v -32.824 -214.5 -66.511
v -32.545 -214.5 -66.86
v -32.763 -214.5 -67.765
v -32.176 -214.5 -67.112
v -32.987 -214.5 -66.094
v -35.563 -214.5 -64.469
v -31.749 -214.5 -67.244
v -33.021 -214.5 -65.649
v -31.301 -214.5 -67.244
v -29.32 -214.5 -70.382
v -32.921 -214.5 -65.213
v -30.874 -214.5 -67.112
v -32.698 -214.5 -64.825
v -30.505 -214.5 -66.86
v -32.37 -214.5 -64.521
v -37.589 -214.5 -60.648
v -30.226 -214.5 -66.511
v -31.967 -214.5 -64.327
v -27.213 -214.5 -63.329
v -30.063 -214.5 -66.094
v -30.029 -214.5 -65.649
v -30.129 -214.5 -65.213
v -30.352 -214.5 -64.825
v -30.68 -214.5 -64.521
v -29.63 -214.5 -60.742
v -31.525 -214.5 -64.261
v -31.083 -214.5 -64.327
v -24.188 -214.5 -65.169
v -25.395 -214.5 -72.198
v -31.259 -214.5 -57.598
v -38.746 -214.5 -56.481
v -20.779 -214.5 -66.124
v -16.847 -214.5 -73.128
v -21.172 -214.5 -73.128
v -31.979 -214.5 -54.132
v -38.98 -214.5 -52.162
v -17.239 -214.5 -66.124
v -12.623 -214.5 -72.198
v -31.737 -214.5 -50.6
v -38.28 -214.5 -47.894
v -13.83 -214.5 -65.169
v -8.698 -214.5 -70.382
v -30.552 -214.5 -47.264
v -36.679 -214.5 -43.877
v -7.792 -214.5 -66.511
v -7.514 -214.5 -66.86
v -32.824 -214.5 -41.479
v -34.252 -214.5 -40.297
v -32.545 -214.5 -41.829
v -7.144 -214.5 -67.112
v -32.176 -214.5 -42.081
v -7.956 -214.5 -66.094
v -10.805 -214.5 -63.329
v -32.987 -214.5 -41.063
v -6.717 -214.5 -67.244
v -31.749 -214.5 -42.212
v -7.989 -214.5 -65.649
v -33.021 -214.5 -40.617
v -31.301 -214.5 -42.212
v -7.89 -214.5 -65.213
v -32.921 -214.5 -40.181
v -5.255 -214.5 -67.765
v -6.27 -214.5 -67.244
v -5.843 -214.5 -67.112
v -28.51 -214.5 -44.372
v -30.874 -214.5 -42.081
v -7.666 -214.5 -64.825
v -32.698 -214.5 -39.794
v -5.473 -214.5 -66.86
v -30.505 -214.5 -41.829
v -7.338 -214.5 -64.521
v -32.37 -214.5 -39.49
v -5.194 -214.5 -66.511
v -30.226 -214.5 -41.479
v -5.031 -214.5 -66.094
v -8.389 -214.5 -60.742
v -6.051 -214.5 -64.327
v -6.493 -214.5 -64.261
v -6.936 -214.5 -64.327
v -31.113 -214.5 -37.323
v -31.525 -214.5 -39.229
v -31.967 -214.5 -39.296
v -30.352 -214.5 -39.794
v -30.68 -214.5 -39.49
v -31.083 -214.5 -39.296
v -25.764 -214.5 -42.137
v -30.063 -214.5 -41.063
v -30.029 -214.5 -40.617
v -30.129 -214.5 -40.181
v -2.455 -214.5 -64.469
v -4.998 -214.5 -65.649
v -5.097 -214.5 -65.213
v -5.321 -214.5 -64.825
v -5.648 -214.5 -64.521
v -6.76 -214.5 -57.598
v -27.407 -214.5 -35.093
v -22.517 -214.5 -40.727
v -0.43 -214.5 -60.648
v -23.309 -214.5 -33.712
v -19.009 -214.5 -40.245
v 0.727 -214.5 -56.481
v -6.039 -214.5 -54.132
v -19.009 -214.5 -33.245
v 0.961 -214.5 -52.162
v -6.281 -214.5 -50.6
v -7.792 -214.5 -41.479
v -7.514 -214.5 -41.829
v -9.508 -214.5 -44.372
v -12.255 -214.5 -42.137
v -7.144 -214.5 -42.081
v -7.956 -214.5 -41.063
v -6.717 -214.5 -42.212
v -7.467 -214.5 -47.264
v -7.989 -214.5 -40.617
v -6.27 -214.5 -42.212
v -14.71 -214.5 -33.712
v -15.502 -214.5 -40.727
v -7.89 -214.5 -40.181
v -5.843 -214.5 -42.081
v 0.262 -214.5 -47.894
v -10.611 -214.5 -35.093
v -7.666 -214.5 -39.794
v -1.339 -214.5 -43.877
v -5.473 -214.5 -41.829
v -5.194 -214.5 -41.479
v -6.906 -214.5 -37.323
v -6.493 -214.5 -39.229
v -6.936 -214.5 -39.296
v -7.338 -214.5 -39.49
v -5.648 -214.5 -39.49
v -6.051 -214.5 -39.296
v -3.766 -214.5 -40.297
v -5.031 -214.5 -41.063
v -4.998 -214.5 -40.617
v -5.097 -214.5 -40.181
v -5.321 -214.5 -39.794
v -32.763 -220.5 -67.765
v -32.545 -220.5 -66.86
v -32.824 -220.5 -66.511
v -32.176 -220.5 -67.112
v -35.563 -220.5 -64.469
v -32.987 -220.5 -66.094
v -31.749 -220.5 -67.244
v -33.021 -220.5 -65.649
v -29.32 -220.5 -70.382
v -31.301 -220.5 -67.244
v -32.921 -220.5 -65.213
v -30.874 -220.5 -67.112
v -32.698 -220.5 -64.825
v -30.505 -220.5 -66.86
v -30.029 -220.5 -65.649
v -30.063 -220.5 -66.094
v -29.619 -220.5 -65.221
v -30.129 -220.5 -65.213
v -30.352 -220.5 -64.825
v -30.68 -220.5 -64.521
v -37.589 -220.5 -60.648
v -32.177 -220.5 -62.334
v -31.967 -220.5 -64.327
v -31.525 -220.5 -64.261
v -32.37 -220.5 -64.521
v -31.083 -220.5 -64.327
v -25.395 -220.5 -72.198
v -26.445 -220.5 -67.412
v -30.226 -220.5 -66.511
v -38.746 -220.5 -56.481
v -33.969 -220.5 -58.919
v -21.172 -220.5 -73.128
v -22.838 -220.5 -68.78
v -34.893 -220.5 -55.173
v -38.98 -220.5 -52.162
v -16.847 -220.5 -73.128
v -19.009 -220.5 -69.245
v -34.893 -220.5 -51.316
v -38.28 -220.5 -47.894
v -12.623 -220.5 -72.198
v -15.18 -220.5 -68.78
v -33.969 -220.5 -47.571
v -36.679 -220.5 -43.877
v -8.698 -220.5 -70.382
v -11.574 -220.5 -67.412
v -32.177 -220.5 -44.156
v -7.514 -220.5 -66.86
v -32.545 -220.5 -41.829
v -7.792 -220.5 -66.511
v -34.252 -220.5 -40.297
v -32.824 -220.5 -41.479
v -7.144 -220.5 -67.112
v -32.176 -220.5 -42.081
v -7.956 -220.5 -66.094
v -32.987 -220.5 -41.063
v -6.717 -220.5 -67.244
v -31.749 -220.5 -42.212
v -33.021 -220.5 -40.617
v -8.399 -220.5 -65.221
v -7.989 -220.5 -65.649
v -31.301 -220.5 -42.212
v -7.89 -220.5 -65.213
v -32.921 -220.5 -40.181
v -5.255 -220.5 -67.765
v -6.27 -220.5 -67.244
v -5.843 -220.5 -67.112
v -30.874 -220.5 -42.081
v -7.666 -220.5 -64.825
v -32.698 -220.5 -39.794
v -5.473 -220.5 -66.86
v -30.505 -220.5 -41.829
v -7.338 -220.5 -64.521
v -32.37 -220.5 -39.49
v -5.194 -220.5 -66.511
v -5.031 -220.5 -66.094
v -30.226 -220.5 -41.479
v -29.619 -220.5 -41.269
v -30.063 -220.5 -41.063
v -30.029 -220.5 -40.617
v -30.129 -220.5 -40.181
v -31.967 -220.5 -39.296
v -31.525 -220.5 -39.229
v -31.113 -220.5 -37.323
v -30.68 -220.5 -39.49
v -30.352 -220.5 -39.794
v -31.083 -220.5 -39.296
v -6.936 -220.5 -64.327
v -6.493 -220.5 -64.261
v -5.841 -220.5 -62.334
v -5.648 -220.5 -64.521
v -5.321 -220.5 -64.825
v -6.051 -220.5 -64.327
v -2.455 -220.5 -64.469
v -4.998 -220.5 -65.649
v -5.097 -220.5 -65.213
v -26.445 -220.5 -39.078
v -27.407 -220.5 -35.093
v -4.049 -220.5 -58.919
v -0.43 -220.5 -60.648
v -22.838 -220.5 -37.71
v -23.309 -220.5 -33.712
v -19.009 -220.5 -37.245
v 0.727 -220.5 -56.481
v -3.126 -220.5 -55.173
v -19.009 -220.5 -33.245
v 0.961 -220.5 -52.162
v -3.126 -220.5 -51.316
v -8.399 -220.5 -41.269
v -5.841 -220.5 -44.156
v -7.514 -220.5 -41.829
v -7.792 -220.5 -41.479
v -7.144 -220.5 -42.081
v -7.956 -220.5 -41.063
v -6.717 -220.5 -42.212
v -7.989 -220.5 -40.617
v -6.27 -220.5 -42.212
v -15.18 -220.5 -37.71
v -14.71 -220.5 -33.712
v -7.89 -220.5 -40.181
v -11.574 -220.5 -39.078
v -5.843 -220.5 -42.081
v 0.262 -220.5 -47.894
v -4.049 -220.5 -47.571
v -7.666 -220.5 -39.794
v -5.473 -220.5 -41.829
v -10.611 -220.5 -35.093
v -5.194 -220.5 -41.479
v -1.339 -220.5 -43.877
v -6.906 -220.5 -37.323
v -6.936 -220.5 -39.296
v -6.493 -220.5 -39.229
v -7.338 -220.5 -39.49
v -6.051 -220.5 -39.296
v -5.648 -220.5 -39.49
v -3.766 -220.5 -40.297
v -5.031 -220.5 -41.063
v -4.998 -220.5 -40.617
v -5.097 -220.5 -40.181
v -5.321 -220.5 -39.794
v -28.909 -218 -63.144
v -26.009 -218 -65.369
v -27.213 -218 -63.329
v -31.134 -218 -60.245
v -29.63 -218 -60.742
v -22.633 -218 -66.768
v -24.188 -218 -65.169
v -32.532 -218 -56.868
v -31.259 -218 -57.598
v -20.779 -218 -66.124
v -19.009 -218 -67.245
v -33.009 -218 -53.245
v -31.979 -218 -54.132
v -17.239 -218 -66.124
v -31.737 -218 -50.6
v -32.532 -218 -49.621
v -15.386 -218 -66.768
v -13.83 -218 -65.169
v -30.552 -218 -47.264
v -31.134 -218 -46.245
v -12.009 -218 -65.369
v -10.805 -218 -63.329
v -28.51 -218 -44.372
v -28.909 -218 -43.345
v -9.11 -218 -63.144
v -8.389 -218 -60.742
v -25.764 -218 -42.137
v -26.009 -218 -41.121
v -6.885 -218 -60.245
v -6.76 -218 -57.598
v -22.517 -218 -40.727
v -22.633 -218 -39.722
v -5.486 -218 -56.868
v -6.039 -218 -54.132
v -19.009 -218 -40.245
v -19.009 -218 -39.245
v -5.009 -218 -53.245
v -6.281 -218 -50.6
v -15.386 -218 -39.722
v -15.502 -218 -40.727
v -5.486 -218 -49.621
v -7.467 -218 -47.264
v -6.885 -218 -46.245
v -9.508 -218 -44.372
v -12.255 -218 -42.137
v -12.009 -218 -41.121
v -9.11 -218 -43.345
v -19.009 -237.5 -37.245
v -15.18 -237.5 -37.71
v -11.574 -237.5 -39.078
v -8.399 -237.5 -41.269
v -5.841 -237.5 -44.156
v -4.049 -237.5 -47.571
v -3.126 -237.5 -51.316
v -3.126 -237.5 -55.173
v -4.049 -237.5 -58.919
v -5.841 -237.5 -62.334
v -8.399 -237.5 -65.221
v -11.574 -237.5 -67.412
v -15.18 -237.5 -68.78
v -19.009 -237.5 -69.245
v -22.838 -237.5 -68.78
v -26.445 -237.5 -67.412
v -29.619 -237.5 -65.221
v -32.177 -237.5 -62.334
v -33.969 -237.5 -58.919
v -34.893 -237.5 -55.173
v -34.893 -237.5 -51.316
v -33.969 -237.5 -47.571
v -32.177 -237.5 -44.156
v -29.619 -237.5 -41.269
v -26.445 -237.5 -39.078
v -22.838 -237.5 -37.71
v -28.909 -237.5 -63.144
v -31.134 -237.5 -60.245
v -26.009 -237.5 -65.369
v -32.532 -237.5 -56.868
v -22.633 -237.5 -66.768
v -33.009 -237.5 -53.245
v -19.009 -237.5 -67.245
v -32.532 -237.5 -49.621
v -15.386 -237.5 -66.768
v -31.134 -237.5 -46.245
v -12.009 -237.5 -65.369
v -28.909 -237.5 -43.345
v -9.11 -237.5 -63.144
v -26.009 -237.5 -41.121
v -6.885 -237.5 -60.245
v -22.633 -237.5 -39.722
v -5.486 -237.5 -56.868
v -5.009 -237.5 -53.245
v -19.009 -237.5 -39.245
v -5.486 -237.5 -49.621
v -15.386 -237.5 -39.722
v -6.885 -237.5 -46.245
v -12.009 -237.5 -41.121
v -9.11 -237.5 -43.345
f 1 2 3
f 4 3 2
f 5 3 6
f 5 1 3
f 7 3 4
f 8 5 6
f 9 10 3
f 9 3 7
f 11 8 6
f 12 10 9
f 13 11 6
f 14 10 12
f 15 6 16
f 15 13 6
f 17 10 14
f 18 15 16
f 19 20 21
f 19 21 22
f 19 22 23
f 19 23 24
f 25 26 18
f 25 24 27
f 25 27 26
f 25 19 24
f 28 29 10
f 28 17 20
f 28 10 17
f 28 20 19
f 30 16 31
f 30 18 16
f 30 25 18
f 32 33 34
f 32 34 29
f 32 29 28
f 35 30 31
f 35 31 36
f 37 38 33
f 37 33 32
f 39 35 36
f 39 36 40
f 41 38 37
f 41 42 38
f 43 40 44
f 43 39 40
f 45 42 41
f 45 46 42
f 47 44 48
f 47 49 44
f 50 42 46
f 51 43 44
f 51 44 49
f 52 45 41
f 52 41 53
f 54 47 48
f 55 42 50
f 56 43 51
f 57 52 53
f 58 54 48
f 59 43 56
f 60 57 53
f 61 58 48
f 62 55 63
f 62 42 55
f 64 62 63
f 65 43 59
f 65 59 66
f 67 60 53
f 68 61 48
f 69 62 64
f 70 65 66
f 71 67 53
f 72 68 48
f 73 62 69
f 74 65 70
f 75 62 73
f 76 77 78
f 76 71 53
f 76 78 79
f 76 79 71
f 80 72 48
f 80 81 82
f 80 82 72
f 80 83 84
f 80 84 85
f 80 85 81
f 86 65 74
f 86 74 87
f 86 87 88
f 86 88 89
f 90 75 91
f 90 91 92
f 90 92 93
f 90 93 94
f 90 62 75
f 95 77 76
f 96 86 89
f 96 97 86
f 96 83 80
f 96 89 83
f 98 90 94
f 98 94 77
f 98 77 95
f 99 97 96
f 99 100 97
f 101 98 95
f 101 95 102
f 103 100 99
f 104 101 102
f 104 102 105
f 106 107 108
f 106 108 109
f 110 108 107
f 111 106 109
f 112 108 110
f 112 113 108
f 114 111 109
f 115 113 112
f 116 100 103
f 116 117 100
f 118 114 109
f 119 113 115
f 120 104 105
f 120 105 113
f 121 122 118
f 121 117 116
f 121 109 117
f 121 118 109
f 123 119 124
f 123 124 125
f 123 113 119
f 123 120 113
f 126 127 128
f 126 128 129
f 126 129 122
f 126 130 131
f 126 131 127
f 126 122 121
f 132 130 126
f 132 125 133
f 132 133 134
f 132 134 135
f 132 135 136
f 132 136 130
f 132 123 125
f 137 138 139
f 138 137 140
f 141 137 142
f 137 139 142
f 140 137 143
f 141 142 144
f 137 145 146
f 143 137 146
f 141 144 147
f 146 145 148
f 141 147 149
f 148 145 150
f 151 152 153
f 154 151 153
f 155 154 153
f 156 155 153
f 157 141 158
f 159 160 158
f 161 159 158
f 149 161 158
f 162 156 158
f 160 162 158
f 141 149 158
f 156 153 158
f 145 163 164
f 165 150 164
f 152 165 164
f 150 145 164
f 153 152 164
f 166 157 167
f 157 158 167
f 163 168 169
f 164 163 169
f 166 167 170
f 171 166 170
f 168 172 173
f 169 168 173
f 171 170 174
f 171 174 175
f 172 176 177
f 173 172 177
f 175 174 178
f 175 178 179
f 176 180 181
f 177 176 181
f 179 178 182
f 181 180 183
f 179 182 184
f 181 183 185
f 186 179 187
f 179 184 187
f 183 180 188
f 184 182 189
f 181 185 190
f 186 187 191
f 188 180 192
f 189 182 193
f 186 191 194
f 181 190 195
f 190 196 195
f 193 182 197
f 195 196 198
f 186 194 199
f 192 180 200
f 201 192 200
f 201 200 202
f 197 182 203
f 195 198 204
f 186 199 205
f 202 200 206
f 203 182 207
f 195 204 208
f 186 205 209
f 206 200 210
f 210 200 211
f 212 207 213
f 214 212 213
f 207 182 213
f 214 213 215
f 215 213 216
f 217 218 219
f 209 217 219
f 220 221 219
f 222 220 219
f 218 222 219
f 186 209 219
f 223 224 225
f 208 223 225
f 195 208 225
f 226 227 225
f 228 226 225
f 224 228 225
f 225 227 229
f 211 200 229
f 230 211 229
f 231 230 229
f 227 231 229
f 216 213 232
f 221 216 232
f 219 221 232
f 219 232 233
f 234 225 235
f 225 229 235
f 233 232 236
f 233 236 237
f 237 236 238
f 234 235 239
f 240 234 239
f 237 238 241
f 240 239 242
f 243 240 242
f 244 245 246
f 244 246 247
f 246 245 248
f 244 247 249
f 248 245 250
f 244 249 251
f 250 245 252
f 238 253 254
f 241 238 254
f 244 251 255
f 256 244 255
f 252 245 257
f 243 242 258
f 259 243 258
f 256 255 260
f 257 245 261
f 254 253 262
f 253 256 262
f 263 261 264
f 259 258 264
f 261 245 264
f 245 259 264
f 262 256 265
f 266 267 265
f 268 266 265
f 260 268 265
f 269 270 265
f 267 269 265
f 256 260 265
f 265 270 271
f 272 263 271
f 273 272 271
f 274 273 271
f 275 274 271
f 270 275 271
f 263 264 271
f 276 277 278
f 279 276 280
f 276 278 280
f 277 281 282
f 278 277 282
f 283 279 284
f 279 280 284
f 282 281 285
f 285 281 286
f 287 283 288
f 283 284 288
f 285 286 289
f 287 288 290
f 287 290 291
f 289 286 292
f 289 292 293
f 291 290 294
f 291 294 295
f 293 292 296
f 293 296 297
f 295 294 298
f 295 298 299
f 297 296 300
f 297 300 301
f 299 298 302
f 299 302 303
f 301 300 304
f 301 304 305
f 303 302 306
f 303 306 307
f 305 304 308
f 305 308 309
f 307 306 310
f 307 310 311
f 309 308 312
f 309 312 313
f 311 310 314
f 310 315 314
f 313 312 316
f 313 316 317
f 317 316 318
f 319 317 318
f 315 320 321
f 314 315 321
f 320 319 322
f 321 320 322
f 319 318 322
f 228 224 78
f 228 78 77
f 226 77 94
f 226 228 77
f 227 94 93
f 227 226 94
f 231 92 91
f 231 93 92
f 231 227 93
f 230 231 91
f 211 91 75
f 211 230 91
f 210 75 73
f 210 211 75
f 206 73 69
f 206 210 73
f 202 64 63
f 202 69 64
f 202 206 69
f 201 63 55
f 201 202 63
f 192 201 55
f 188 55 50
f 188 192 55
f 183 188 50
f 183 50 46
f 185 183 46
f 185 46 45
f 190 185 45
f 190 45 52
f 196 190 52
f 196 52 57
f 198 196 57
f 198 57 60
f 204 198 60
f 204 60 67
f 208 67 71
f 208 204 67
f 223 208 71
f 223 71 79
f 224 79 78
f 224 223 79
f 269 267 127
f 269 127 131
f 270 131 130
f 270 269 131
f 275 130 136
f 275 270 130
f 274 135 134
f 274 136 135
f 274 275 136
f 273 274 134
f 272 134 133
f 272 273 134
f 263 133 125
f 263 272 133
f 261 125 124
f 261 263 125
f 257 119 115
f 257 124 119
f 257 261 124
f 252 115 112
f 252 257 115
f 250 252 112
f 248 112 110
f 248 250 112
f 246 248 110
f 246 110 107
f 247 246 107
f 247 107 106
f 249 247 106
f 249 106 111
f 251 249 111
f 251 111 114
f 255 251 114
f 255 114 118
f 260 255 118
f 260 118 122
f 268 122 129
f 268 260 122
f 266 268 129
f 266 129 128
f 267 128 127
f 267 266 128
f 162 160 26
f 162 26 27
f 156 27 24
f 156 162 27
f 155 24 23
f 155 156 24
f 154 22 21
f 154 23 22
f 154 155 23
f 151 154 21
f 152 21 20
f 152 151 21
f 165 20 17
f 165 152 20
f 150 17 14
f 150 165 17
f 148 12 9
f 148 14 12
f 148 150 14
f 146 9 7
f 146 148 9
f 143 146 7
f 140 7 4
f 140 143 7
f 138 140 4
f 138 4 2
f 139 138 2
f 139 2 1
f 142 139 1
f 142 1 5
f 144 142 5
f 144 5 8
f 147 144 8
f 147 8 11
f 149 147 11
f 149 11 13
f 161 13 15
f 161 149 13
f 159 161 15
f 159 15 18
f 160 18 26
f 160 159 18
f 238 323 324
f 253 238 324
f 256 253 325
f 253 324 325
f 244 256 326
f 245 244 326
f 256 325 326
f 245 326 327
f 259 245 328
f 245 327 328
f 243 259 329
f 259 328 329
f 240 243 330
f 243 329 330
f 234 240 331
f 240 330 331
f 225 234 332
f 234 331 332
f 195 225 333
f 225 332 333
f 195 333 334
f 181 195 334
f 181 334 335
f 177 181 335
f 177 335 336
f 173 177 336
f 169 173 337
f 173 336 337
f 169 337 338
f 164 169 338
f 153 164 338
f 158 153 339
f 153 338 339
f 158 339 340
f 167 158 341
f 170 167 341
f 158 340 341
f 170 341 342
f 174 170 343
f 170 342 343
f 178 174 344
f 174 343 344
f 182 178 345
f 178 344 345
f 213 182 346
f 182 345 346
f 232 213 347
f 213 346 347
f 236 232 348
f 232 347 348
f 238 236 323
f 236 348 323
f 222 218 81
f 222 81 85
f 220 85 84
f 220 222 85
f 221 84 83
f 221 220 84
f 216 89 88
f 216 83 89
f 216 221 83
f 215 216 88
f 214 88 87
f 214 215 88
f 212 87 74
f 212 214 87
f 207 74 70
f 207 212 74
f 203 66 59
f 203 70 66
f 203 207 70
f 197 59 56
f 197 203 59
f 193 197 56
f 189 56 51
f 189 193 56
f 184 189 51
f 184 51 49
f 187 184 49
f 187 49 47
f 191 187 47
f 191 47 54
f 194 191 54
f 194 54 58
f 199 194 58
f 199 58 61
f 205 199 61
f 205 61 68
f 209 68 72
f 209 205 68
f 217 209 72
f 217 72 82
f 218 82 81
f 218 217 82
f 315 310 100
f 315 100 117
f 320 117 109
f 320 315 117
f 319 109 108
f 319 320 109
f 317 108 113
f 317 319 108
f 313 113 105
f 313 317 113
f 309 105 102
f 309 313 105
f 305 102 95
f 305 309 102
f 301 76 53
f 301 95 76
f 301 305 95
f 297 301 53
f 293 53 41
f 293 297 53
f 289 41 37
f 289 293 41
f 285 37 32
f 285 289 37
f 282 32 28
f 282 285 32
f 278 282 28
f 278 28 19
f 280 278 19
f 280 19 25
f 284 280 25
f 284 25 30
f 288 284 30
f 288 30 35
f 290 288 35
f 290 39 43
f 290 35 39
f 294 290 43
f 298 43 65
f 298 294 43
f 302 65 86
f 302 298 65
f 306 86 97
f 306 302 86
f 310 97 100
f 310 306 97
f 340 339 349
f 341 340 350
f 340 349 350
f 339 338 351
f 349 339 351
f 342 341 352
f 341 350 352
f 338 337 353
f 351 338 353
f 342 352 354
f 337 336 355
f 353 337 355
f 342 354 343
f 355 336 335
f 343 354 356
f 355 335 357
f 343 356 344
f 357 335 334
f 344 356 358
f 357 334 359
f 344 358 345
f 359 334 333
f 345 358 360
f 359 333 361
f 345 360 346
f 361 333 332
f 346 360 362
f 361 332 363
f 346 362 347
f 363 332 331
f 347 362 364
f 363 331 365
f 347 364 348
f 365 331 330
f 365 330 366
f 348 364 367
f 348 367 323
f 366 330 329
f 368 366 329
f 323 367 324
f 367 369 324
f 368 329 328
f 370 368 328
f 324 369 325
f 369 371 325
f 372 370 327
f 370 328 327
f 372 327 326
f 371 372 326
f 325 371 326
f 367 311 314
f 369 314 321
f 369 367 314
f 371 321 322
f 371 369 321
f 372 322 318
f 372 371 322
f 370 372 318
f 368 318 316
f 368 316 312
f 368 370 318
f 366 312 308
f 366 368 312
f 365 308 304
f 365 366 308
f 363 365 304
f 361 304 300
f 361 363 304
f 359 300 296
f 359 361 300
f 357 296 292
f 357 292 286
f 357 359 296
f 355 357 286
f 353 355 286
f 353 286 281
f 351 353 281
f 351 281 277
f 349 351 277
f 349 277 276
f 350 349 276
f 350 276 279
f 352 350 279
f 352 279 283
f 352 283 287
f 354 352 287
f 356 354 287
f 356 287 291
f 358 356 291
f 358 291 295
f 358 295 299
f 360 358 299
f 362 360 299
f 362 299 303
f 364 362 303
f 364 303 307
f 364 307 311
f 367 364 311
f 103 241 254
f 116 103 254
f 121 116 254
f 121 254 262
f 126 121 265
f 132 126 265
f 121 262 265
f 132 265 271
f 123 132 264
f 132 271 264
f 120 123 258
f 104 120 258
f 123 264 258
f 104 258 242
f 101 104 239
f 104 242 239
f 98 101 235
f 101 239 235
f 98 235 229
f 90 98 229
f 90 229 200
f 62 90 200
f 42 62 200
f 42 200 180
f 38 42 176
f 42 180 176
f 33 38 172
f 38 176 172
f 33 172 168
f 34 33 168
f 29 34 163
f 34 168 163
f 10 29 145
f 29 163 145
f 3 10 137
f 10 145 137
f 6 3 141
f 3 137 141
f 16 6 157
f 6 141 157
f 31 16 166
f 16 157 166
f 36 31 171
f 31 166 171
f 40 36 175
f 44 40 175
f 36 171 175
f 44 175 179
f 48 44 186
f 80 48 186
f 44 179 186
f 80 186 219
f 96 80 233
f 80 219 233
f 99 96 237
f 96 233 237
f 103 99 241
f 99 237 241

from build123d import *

# Parameters (mm, degrees)
CARTRIDGE_BARREL_SKETCH_R         = 16
CARTRIDGE_BARREL_DEPTH            = 17
SIX_MILLIMETRE_FLANGE_SKETCH_R    = 20
SIX_MILLIMETRE_FLANGE_DEPTH       = 6
BEARING_BORE_SKETCH_R             = 14
BEARING_BORE_DEPTH                = 19.6
OUTER_RACE_SHOULDER_EXIT_SKETCH_R = 13
OUTER_RACE_SHOULDER_EXIT_DEPTH    = 3.6
M3_TAPPED_HOLE_PATTERN_SKETCH_R   = 1.5
M3_TAPPED_HOLE_PATTERN_DEPTH      = 6.2


with BuildPart() as part:
    # Cartridge barrel sketch → Cartridge barrel (new body)
    with BuildSketch(Plane(origin=(0, -237.5, 0), x_dir=(1, 0, 0), z_dir=(0, 1, 0))):
        with Locations(Location((-19.009182883, 53.244882879, 0), (0, 0, 270))):
            Circle(CARTRIDGE_BARREL_SKETCH_R)
    extrude(amount=CARTRIDGE_BARREL_DEPTH)

    # Six millimetre flange sketch → Six millimetre flange (add)
    with BuildSketch(Plane(origin=(0, -220.5, 0), x_dir=(1, 0, 0), z_dir=(0, 1, 0))):
        with Locations(Location((-19.009182883, 53.244882879, 0), (0, 0, 270))):
            Circle(SIX_MILLIMETRE_FLANGE_SKETCH_R)
    extrude(amount=SIX_MILLIMETRE_FLANGE_DEPTH)

    # Bearing bore sketch → Bearing bore (cut)
    with BuildSketch(Plane(origin=(0, -237.6, 0), x_dir=(1, 0, 0), z_dir=(0, 1, 0))):
        with Locations(Location((-19.009182883, 53.244882879, 0), (0, 0, 270))):
            Circle(BEARING_BORE_SKETCH_R)
    extrude(amount=BEARING_BORE_DEPTH, mode=Mode.SUBTRACT)

    # Outer race shoulder exit sketch → Outer race shoulder exit (cut)
    with BuildSketch(Plane(origin=(0, -218, 0), x_dir=(1, 0, 0), z_dir=(0, 1, 0))):
        with Locations(Location((-19.009182883, 53.244882879, 0), (0, 0, 270))):
            Circle(OUTER_RACE_SHOULDER_EXIT_SKETCH_R)
    extrude(amount=OUTER_RACE_SHOULDER_EXIT_DEPTH, mode=Mode.SUBTRACT)

    # M3 tapped hole pattern sketch → M3 tapped hole pattern (cut)
    with BuildSketch(Plane(origin=(0, -220.6, 0), x_dir=(1, 0, 0), z_dir=(0, 1, 0))):
        with Locations(Location((-6.493392856, 40.729092852, 0), (0, 0, 270))):
            Circle(M3_TAPPED_HOLE_PATTERN_SKETCH_R)
        with Locations(Location((-31.52497291, 40.729092852, 0), (0, 0, 270))):
            Circle(M3_TAPPED_HOLE_PATTERN_SKETCH_R)
        with Locations(Location((-31.52497291, 65.760672906, 0), (0, 0, 270))):
            Circle(M3_TAPPED_HOLE_PATTERN_SKETCH_R)
        with Locations(Location((-6.493392856, 65.760672906, 0), (0, 0, 270))):
            Circle(M3_TAPPED_HOLE_PATTERN_SKETCH_R)
    extrude(amount=M3_TAPPED_HOLE_PATTERN_DEPTH, mode=Mode.SUBTRACT)


solid = part.part
